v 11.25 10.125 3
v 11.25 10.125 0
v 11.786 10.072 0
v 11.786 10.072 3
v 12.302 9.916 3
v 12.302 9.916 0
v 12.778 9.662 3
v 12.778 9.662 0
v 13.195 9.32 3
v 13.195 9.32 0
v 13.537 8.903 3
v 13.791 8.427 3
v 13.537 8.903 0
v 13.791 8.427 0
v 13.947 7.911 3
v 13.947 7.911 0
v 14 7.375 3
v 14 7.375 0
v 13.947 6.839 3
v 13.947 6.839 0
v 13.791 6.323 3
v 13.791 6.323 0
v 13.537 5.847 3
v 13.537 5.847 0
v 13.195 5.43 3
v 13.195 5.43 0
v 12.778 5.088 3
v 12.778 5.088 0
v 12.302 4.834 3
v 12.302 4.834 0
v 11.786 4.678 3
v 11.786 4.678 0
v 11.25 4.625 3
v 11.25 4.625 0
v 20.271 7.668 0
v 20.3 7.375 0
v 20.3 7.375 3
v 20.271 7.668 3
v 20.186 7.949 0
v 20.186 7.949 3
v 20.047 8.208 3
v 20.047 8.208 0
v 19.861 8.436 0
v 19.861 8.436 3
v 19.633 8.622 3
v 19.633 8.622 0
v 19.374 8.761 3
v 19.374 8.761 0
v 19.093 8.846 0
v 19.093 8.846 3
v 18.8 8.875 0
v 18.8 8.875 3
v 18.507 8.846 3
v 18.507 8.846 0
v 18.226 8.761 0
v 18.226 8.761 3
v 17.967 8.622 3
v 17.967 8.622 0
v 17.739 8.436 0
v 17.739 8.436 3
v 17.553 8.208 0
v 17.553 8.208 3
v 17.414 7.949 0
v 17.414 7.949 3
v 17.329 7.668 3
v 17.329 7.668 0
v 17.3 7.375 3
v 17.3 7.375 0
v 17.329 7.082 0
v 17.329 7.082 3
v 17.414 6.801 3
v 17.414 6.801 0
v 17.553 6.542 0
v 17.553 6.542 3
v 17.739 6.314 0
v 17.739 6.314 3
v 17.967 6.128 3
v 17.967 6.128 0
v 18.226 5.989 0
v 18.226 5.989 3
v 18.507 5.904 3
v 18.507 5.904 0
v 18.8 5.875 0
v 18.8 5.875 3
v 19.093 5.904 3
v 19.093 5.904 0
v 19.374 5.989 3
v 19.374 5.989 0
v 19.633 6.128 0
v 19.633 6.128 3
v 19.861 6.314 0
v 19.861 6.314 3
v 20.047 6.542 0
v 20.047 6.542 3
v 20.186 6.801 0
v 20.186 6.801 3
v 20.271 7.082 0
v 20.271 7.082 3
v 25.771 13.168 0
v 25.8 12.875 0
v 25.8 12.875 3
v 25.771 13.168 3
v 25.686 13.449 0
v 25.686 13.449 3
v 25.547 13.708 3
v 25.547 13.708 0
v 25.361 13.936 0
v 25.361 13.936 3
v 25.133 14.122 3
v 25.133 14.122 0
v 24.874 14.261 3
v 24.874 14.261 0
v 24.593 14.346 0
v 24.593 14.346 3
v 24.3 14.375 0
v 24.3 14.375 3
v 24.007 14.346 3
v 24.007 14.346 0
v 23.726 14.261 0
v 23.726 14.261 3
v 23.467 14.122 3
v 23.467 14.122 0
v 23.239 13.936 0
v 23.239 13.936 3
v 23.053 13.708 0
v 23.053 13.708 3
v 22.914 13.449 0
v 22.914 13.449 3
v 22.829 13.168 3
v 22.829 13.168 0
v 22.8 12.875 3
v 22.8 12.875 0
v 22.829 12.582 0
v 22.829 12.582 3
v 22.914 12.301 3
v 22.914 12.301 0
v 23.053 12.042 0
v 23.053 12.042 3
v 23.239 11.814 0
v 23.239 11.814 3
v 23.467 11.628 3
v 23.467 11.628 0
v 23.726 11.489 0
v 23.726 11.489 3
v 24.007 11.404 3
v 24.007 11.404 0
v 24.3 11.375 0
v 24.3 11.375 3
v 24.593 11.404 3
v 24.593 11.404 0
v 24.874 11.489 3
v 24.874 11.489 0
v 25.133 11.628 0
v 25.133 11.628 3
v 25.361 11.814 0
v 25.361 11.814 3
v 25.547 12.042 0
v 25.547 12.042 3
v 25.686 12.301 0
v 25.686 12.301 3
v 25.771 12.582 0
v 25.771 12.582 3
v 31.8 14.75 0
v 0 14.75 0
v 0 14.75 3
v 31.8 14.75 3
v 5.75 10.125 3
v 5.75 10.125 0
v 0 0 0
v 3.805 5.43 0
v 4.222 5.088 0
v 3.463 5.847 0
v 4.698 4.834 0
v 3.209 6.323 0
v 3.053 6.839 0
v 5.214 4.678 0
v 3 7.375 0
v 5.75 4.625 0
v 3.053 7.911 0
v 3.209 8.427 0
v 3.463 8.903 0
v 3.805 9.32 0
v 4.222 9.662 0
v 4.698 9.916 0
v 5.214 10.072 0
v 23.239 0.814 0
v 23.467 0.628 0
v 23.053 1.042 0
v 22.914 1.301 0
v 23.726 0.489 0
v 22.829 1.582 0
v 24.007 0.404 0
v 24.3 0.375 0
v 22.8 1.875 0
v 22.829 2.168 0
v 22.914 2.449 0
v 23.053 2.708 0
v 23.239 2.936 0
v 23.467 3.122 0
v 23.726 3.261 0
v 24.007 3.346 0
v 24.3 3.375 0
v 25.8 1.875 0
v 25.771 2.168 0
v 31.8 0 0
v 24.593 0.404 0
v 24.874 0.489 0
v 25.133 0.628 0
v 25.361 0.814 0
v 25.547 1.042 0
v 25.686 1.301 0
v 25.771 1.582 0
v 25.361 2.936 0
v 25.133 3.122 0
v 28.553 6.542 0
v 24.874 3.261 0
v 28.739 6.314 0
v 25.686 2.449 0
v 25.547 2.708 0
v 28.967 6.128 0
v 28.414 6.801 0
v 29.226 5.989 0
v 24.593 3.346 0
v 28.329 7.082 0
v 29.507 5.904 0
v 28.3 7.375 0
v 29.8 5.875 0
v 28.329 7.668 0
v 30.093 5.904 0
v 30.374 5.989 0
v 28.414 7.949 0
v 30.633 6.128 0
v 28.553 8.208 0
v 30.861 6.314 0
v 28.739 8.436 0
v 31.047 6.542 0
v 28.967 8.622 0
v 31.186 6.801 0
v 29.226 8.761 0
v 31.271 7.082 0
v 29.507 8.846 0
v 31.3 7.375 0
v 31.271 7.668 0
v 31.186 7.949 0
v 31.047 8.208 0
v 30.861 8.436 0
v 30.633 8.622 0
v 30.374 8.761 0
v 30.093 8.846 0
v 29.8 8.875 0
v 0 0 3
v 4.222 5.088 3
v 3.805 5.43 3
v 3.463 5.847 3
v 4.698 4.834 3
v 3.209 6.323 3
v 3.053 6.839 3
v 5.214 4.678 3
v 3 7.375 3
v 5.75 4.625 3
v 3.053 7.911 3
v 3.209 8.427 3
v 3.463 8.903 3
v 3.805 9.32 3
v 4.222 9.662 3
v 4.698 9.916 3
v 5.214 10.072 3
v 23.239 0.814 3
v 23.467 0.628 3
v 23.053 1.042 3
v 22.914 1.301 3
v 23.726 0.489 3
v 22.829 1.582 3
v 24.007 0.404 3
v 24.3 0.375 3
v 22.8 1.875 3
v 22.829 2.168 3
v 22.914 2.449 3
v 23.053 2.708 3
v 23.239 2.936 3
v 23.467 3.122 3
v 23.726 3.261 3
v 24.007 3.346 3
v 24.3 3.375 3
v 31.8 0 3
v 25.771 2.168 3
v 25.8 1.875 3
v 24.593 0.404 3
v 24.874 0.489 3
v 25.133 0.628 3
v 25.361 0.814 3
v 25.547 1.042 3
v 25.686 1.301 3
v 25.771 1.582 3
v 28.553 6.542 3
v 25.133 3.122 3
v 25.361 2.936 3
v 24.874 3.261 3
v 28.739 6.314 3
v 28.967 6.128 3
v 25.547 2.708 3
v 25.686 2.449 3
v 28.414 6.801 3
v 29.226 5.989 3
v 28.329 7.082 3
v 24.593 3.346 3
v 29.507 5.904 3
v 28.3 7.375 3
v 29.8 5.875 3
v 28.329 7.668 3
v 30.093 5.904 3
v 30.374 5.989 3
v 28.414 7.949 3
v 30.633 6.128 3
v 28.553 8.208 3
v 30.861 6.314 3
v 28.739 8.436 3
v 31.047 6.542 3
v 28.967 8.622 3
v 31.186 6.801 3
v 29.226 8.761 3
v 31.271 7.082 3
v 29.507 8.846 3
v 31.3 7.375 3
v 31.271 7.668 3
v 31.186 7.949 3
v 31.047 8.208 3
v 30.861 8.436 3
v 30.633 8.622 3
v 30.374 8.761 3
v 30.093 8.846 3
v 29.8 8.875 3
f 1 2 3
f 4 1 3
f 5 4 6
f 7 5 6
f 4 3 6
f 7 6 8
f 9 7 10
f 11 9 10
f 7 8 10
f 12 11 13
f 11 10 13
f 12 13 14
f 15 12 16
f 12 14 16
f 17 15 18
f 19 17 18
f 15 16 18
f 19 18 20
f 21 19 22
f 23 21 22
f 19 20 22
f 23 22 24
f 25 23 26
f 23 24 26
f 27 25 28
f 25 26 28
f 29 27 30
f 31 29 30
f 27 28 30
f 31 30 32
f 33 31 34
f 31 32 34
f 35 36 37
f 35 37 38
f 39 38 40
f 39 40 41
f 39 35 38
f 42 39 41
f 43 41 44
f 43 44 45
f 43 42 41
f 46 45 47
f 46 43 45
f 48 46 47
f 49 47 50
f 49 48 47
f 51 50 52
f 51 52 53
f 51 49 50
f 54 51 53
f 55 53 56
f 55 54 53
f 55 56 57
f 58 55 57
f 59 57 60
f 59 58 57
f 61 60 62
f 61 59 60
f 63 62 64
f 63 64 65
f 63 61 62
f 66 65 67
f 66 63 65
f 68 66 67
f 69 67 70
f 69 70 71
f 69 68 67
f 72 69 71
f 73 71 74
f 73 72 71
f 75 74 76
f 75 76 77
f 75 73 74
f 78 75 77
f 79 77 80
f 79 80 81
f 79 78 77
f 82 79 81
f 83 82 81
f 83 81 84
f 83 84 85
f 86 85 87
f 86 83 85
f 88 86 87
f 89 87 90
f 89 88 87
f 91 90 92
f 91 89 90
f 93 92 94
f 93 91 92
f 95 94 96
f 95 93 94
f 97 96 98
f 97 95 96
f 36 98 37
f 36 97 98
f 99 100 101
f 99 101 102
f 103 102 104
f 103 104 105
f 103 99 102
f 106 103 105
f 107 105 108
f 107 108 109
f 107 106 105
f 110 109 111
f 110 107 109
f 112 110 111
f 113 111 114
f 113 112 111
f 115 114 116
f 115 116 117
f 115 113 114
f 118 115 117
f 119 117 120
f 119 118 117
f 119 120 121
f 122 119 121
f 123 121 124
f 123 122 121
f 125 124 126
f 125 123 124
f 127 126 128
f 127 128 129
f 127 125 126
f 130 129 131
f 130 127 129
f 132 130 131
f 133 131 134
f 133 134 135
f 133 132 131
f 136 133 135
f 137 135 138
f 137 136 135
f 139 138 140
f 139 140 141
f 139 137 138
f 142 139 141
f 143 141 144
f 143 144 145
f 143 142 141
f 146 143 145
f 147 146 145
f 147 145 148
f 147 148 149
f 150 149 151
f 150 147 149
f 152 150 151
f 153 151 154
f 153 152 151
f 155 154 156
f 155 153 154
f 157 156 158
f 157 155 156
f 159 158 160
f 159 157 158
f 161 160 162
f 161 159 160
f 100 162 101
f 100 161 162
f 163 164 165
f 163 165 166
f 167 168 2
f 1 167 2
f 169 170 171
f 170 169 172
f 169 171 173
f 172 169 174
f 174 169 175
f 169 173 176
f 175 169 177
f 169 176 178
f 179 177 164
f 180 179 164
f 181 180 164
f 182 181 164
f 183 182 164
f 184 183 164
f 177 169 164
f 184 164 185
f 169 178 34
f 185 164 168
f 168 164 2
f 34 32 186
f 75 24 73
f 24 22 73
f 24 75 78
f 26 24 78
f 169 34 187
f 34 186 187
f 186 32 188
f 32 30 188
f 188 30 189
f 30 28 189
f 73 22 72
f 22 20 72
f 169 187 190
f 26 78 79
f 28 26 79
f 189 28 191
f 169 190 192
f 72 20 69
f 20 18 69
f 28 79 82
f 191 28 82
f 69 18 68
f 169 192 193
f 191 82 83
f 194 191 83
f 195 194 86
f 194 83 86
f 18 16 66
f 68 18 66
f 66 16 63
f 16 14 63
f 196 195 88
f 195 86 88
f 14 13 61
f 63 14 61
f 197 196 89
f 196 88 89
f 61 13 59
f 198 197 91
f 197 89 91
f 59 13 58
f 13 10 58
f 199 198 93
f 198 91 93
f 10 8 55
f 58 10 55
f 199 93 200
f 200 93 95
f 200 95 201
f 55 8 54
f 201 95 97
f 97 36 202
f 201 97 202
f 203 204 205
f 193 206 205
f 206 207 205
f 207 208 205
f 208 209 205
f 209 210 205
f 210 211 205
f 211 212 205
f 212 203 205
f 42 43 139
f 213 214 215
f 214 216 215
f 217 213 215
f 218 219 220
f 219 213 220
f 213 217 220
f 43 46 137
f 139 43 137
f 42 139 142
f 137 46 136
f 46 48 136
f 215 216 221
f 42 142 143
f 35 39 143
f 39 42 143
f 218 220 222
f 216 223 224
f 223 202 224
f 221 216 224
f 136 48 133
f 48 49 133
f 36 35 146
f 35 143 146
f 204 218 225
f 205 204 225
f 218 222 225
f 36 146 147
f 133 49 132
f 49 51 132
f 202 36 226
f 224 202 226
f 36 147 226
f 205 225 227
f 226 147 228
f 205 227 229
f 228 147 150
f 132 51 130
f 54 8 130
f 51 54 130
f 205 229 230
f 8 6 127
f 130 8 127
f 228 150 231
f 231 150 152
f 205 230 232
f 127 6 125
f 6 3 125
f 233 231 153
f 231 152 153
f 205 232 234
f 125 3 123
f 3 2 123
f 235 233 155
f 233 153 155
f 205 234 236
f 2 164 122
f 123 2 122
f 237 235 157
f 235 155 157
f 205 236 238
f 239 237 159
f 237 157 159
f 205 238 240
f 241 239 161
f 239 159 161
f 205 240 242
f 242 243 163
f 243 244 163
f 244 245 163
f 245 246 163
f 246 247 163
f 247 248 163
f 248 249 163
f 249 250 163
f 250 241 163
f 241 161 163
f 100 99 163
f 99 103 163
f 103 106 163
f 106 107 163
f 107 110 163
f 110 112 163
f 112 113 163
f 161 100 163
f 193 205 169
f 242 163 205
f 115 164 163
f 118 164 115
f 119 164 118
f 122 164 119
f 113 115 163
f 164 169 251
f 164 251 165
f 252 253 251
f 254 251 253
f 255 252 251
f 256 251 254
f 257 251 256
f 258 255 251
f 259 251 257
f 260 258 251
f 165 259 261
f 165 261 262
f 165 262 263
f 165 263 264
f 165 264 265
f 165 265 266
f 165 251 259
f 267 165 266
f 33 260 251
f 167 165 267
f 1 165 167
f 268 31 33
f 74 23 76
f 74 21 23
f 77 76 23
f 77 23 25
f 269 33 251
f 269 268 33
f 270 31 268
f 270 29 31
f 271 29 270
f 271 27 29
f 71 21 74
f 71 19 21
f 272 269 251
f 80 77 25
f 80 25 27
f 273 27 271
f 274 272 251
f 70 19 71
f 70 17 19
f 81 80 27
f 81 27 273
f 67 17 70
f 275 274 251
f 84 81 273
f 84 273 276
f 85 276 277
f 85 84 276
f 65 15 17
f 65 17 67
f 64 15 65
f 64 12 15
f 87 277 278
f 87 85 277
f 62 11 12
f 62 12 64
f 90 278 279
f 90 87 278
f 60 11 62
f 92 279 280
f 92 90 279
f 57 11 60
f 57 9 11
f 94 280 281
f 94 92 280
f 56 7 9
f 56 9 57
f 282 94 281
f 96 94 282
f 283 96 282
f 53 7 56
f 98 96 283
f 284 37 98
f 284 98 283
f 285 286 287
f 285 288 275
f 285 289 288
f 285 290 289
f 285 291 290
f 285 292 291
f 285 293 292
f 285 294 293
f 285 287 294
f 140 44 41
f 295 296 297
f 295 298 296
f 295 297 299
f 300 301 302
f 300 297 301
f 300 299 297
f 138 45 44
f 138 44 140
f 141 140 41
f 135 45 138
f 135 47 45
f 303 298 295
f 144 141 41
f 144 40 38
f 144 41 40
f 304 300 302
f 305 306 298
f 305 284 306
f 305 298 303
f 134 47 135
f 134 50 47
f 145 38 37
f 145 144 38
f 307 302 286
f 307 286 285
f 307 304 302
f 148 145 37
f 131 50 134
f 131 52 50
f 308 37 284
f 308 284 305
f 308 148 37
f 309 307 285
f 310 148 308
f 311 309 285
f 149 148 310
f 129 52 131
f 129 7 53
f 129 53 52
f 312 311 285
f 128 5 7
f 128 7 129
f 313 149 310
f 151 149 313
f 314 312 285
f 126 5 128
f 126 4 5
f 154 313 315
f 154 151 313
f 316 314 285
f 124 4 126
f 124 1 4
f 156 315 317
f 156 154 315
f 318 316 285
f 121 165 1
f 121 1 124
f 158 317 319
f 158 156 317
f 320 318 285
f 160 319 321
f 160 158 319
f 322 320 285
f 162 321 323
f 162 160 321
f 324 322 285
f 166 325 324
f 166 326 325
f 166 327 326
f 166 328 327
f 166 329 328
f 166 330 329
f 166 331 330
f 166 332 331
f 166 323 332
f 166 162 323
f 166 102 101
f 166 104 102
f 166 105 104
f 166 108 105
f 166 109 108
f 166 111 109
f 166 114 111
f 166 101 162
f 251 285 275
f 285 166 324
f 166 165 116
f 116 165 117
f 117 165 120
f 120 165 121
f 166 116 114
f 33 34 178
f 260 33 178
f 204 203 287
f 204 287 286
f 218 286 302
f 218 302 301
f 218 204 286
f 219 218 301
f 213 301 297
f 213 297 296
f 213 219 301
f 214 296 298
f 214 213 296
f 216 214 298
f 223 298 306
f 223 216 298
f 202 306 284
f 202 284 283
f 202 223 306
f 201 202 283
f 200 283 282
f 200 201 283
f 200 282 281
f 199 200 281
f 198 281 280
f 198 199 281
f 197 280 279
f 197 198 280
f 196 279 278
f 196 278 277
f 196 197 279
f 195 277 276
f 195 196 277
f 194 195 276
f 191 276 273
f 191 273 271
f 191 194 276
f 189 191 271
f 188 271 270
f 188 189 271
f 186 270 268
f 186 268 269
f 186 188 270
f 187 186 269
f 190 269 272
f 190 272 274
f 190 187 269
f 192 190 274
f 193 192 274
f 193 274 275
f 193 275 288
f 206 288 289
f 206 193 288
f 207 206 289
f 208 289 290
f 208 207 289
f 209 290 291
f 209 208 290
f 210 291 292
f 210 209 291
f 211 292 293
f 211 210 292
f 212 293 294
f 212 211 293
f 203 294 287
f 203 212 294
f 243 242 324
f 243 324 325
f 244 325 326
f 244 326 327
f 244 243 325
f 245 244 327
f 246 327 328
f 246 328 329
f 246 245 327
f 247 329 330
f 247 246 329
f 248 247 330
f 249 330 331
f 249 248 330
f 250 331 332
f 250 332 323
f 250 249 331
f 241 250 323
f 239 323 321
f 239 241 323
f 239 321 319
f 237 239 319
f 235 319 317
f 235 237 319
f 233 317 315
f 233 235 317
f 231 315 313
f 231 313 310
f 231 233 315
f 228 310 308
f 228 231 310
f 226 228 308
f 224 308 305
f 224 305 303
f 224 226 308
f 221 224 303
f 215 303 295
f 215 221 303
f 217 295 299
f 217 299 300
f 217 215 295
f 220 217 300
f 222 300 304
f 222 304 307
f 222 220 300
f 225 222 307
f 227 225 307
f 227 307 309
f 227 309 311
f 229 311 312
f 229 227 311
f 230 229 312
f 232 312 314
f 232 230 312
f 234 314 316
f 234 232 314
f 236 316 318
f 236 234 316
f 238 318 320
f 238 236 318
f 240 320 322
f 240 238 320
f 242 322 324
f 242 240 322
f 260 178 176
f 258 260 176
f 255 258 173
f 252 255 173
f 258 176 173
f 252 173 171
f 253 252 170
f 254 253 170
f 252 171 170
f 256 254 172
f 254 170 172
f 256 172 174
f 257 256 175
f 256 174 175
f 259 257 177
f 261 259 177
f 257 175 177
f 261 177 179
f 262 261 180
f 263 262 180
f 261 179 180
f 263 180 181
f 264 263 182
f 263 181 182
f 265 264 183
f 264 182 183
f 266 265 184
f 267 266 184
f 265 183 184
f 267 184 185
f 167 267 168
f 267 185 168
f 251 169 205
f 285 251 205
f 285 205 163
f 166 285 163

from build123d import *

# Parameters (mm, degrees)
SKETCH1_W           = 31.8
SKETCH1_H           = 14.75
SKETCH1_R           = 1.5
BOSS_EXTRUDE1_DEPTH = 3


with BuildPart() as part:
    # Sketch1 → Boss-Extrude1 (new body)
    with BuildSketch(Plane.XY):
        with Locations((15.9, 7.375)):
            Rectangle(SKETCH1_W, SKETCH1_H)
        with Locations((29.8, 7.375)):
            Circle(SKETCH1_R, mode=Mode.SUBTRACT)
        with Locations((18.8, 7.375)):
            Circle(SKETCH1_R, mode=Mode.SUBTRACT)
        with Locations((24.3, 12.875)):
            Circle(SKETCH1_R, mode=Mode.SUBTRACT)
        with Locations((24.3, 1.875)):
            Circle(SKETCH1_R, mode=Mode.SUBTRACT)
        with BuildLine():
            Line((5.75, 10.125), (11.25, 10.125))
            ThreePointArc((11.25, 10.125), (14, 7.375), (11.25, 4.625))
            Line((11.25, 4.625), (5.75, 4.625))
            ThreePointArc((5.75, 4.625), (3, 7.375), (5.75, 10.125))
        make_face(mode=Mode.SUBTRACT)
    extrude(amount=BOSS_EXTRUDE1_DEPTH)


solid = part.part
